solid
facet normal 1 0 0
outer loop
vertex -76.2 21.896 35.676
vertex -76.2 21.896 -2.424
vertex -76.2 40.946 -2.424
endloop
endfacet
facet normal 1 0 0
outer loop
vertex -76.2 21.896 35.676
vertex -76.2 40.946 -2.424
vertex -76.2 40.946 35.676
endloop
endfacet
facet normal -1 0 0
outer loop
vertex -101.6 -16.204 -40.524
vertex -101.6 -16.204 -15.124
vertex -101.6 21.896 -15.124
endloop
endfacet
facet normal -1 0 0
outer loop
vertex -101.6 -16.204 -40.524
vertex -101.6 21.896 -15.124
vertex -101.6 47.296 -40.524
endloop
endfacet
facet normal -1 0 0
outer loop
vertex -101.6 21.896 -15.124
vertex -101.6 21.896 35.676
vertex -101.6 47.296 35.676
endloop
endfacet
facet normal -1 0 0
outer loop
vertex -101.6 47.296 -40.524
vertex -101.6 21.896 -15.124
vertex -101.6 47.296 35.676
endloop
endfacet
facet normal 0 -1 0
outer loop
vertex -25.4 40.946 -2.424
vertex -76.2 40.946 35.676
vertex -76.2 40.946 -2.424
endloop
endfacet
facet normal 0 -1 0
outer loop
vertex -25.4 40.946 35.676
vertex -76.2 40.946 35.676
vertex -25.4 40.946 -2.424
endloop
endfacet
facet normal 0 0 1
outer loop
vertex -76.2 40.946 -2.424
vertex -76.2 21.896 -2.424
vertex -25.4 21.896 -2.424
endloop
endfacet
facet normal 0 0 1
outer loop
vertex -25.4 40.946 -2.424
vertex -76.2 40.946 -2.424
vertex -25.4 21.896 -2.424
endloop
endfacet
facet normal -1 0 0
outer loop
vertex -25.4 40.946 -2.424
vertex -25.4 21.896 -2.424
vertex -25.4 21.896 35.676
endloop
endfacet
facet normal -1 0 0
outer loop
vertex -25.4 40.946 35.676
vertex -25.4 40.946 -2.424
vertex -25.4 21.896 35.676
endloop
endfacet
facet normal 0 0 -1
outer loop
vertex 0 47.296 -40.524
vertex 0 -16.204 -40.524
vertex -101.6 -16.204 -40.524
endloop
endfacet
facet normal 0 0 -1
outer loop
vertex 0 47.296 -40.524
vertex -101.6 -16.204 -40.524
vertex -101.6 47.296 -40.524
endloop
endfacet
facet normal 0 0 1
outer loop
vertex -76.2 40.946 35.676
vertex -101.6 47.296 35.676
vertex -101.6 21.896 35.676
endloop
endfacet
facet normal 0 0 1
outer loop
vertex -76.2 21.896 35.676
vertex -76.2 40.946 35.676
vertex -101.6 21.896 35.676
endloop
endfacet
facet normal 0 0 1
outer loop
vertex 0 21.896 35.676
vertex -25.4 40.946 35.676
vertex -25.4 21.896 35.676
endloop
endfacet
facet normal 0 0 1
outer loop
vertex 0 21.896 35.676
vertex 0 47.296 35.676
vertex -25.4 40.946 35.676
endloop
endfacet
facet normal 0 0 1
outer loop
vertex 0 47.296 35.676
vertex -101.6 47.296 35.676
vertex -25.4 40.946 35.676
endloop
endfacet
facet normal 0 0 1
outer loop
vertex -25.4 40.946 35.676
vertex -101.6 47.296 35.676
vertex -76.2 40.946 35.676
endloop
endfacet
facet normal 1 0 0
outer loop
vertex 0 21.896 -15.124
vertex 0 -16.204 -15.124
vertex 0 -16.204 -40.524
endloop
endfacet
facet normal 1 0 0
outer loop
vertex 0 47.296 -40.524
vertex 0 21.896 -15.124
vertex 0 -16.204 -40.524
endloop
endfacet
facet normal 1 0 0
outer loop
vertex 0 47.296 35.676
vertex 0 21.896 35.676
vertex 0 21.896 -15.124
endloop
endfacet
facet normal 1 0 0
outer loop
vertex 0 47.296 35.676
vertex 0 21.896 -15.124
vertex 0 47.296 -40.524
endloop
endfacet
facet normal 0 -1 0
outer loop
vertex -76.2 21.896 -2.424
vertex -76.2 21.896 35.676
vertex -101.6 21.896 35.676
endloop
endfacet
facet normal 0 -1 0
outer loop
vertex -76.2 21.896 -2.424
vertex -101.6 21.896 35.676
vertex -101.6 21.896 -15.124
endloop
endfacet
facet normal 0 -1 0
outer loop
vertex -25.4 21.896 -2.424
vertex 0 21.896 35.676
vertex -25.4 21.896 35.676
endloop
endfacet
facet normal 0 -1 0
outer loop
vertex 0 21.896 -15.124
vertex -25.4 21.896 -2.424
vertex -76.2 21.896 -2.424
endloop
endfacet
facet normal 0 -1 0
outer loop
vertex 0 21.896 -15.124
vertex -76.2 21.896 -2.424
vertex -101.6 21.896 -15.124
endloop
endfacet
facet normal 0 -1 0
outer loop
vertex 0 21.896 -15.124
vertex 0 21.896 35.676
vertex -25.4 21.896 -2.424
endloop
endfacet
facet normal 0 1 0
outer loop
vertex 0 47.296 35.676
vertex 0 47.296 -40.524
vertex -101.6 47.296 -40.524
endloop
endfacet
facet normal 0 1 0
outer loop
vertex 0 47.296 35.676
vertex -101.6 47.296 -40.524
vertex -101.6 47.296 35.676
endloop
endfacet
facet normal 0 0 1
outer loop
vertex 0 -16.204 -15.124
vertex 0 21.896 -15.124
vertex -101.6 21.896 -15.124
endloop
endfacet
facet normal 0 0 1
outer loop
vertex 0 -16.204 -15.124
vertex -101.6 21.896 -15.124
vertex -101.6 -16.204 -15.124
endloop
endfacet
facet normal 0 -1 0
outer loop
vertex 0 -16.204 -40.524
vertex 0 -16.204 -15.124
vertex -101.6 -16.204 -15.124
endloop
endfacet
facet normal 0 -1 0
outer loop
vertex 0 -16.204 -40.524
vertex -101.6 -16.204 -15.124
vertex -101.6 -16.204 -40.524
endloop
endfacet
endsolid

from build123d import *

# Parameters (mm, degrees)
F1_DEPTH = 101.6
F2_W     = 50.8
F2_H     = 38.1
F3_DEPTH = 19.05


with BuildPart() as f1:
    # F0 (on Right) → F1 (new body)
    with BuildSketch(Plane.YZ):
        Polygon((-16.204383, -15.124001), (-16.204383, -40.524001), (47.295617, -40.524001), (47.295617, 35.675999), (21.895617, 35.675999), (21.895617, -15.124001), align=None)
    extrude(amount=-F1_DEPTH)

    # F2 (on face) → F3 (cut)
    with BuildSketch(Plane.XZ.offset(-21.895617)):
        with Locations((-50.8, 16.625999)):
            Rectangle(F2_W, F2_H)
    extrude(amount=-F3_DEPTH, mode=Mode.SUBTRACT)


solid = f1.part
